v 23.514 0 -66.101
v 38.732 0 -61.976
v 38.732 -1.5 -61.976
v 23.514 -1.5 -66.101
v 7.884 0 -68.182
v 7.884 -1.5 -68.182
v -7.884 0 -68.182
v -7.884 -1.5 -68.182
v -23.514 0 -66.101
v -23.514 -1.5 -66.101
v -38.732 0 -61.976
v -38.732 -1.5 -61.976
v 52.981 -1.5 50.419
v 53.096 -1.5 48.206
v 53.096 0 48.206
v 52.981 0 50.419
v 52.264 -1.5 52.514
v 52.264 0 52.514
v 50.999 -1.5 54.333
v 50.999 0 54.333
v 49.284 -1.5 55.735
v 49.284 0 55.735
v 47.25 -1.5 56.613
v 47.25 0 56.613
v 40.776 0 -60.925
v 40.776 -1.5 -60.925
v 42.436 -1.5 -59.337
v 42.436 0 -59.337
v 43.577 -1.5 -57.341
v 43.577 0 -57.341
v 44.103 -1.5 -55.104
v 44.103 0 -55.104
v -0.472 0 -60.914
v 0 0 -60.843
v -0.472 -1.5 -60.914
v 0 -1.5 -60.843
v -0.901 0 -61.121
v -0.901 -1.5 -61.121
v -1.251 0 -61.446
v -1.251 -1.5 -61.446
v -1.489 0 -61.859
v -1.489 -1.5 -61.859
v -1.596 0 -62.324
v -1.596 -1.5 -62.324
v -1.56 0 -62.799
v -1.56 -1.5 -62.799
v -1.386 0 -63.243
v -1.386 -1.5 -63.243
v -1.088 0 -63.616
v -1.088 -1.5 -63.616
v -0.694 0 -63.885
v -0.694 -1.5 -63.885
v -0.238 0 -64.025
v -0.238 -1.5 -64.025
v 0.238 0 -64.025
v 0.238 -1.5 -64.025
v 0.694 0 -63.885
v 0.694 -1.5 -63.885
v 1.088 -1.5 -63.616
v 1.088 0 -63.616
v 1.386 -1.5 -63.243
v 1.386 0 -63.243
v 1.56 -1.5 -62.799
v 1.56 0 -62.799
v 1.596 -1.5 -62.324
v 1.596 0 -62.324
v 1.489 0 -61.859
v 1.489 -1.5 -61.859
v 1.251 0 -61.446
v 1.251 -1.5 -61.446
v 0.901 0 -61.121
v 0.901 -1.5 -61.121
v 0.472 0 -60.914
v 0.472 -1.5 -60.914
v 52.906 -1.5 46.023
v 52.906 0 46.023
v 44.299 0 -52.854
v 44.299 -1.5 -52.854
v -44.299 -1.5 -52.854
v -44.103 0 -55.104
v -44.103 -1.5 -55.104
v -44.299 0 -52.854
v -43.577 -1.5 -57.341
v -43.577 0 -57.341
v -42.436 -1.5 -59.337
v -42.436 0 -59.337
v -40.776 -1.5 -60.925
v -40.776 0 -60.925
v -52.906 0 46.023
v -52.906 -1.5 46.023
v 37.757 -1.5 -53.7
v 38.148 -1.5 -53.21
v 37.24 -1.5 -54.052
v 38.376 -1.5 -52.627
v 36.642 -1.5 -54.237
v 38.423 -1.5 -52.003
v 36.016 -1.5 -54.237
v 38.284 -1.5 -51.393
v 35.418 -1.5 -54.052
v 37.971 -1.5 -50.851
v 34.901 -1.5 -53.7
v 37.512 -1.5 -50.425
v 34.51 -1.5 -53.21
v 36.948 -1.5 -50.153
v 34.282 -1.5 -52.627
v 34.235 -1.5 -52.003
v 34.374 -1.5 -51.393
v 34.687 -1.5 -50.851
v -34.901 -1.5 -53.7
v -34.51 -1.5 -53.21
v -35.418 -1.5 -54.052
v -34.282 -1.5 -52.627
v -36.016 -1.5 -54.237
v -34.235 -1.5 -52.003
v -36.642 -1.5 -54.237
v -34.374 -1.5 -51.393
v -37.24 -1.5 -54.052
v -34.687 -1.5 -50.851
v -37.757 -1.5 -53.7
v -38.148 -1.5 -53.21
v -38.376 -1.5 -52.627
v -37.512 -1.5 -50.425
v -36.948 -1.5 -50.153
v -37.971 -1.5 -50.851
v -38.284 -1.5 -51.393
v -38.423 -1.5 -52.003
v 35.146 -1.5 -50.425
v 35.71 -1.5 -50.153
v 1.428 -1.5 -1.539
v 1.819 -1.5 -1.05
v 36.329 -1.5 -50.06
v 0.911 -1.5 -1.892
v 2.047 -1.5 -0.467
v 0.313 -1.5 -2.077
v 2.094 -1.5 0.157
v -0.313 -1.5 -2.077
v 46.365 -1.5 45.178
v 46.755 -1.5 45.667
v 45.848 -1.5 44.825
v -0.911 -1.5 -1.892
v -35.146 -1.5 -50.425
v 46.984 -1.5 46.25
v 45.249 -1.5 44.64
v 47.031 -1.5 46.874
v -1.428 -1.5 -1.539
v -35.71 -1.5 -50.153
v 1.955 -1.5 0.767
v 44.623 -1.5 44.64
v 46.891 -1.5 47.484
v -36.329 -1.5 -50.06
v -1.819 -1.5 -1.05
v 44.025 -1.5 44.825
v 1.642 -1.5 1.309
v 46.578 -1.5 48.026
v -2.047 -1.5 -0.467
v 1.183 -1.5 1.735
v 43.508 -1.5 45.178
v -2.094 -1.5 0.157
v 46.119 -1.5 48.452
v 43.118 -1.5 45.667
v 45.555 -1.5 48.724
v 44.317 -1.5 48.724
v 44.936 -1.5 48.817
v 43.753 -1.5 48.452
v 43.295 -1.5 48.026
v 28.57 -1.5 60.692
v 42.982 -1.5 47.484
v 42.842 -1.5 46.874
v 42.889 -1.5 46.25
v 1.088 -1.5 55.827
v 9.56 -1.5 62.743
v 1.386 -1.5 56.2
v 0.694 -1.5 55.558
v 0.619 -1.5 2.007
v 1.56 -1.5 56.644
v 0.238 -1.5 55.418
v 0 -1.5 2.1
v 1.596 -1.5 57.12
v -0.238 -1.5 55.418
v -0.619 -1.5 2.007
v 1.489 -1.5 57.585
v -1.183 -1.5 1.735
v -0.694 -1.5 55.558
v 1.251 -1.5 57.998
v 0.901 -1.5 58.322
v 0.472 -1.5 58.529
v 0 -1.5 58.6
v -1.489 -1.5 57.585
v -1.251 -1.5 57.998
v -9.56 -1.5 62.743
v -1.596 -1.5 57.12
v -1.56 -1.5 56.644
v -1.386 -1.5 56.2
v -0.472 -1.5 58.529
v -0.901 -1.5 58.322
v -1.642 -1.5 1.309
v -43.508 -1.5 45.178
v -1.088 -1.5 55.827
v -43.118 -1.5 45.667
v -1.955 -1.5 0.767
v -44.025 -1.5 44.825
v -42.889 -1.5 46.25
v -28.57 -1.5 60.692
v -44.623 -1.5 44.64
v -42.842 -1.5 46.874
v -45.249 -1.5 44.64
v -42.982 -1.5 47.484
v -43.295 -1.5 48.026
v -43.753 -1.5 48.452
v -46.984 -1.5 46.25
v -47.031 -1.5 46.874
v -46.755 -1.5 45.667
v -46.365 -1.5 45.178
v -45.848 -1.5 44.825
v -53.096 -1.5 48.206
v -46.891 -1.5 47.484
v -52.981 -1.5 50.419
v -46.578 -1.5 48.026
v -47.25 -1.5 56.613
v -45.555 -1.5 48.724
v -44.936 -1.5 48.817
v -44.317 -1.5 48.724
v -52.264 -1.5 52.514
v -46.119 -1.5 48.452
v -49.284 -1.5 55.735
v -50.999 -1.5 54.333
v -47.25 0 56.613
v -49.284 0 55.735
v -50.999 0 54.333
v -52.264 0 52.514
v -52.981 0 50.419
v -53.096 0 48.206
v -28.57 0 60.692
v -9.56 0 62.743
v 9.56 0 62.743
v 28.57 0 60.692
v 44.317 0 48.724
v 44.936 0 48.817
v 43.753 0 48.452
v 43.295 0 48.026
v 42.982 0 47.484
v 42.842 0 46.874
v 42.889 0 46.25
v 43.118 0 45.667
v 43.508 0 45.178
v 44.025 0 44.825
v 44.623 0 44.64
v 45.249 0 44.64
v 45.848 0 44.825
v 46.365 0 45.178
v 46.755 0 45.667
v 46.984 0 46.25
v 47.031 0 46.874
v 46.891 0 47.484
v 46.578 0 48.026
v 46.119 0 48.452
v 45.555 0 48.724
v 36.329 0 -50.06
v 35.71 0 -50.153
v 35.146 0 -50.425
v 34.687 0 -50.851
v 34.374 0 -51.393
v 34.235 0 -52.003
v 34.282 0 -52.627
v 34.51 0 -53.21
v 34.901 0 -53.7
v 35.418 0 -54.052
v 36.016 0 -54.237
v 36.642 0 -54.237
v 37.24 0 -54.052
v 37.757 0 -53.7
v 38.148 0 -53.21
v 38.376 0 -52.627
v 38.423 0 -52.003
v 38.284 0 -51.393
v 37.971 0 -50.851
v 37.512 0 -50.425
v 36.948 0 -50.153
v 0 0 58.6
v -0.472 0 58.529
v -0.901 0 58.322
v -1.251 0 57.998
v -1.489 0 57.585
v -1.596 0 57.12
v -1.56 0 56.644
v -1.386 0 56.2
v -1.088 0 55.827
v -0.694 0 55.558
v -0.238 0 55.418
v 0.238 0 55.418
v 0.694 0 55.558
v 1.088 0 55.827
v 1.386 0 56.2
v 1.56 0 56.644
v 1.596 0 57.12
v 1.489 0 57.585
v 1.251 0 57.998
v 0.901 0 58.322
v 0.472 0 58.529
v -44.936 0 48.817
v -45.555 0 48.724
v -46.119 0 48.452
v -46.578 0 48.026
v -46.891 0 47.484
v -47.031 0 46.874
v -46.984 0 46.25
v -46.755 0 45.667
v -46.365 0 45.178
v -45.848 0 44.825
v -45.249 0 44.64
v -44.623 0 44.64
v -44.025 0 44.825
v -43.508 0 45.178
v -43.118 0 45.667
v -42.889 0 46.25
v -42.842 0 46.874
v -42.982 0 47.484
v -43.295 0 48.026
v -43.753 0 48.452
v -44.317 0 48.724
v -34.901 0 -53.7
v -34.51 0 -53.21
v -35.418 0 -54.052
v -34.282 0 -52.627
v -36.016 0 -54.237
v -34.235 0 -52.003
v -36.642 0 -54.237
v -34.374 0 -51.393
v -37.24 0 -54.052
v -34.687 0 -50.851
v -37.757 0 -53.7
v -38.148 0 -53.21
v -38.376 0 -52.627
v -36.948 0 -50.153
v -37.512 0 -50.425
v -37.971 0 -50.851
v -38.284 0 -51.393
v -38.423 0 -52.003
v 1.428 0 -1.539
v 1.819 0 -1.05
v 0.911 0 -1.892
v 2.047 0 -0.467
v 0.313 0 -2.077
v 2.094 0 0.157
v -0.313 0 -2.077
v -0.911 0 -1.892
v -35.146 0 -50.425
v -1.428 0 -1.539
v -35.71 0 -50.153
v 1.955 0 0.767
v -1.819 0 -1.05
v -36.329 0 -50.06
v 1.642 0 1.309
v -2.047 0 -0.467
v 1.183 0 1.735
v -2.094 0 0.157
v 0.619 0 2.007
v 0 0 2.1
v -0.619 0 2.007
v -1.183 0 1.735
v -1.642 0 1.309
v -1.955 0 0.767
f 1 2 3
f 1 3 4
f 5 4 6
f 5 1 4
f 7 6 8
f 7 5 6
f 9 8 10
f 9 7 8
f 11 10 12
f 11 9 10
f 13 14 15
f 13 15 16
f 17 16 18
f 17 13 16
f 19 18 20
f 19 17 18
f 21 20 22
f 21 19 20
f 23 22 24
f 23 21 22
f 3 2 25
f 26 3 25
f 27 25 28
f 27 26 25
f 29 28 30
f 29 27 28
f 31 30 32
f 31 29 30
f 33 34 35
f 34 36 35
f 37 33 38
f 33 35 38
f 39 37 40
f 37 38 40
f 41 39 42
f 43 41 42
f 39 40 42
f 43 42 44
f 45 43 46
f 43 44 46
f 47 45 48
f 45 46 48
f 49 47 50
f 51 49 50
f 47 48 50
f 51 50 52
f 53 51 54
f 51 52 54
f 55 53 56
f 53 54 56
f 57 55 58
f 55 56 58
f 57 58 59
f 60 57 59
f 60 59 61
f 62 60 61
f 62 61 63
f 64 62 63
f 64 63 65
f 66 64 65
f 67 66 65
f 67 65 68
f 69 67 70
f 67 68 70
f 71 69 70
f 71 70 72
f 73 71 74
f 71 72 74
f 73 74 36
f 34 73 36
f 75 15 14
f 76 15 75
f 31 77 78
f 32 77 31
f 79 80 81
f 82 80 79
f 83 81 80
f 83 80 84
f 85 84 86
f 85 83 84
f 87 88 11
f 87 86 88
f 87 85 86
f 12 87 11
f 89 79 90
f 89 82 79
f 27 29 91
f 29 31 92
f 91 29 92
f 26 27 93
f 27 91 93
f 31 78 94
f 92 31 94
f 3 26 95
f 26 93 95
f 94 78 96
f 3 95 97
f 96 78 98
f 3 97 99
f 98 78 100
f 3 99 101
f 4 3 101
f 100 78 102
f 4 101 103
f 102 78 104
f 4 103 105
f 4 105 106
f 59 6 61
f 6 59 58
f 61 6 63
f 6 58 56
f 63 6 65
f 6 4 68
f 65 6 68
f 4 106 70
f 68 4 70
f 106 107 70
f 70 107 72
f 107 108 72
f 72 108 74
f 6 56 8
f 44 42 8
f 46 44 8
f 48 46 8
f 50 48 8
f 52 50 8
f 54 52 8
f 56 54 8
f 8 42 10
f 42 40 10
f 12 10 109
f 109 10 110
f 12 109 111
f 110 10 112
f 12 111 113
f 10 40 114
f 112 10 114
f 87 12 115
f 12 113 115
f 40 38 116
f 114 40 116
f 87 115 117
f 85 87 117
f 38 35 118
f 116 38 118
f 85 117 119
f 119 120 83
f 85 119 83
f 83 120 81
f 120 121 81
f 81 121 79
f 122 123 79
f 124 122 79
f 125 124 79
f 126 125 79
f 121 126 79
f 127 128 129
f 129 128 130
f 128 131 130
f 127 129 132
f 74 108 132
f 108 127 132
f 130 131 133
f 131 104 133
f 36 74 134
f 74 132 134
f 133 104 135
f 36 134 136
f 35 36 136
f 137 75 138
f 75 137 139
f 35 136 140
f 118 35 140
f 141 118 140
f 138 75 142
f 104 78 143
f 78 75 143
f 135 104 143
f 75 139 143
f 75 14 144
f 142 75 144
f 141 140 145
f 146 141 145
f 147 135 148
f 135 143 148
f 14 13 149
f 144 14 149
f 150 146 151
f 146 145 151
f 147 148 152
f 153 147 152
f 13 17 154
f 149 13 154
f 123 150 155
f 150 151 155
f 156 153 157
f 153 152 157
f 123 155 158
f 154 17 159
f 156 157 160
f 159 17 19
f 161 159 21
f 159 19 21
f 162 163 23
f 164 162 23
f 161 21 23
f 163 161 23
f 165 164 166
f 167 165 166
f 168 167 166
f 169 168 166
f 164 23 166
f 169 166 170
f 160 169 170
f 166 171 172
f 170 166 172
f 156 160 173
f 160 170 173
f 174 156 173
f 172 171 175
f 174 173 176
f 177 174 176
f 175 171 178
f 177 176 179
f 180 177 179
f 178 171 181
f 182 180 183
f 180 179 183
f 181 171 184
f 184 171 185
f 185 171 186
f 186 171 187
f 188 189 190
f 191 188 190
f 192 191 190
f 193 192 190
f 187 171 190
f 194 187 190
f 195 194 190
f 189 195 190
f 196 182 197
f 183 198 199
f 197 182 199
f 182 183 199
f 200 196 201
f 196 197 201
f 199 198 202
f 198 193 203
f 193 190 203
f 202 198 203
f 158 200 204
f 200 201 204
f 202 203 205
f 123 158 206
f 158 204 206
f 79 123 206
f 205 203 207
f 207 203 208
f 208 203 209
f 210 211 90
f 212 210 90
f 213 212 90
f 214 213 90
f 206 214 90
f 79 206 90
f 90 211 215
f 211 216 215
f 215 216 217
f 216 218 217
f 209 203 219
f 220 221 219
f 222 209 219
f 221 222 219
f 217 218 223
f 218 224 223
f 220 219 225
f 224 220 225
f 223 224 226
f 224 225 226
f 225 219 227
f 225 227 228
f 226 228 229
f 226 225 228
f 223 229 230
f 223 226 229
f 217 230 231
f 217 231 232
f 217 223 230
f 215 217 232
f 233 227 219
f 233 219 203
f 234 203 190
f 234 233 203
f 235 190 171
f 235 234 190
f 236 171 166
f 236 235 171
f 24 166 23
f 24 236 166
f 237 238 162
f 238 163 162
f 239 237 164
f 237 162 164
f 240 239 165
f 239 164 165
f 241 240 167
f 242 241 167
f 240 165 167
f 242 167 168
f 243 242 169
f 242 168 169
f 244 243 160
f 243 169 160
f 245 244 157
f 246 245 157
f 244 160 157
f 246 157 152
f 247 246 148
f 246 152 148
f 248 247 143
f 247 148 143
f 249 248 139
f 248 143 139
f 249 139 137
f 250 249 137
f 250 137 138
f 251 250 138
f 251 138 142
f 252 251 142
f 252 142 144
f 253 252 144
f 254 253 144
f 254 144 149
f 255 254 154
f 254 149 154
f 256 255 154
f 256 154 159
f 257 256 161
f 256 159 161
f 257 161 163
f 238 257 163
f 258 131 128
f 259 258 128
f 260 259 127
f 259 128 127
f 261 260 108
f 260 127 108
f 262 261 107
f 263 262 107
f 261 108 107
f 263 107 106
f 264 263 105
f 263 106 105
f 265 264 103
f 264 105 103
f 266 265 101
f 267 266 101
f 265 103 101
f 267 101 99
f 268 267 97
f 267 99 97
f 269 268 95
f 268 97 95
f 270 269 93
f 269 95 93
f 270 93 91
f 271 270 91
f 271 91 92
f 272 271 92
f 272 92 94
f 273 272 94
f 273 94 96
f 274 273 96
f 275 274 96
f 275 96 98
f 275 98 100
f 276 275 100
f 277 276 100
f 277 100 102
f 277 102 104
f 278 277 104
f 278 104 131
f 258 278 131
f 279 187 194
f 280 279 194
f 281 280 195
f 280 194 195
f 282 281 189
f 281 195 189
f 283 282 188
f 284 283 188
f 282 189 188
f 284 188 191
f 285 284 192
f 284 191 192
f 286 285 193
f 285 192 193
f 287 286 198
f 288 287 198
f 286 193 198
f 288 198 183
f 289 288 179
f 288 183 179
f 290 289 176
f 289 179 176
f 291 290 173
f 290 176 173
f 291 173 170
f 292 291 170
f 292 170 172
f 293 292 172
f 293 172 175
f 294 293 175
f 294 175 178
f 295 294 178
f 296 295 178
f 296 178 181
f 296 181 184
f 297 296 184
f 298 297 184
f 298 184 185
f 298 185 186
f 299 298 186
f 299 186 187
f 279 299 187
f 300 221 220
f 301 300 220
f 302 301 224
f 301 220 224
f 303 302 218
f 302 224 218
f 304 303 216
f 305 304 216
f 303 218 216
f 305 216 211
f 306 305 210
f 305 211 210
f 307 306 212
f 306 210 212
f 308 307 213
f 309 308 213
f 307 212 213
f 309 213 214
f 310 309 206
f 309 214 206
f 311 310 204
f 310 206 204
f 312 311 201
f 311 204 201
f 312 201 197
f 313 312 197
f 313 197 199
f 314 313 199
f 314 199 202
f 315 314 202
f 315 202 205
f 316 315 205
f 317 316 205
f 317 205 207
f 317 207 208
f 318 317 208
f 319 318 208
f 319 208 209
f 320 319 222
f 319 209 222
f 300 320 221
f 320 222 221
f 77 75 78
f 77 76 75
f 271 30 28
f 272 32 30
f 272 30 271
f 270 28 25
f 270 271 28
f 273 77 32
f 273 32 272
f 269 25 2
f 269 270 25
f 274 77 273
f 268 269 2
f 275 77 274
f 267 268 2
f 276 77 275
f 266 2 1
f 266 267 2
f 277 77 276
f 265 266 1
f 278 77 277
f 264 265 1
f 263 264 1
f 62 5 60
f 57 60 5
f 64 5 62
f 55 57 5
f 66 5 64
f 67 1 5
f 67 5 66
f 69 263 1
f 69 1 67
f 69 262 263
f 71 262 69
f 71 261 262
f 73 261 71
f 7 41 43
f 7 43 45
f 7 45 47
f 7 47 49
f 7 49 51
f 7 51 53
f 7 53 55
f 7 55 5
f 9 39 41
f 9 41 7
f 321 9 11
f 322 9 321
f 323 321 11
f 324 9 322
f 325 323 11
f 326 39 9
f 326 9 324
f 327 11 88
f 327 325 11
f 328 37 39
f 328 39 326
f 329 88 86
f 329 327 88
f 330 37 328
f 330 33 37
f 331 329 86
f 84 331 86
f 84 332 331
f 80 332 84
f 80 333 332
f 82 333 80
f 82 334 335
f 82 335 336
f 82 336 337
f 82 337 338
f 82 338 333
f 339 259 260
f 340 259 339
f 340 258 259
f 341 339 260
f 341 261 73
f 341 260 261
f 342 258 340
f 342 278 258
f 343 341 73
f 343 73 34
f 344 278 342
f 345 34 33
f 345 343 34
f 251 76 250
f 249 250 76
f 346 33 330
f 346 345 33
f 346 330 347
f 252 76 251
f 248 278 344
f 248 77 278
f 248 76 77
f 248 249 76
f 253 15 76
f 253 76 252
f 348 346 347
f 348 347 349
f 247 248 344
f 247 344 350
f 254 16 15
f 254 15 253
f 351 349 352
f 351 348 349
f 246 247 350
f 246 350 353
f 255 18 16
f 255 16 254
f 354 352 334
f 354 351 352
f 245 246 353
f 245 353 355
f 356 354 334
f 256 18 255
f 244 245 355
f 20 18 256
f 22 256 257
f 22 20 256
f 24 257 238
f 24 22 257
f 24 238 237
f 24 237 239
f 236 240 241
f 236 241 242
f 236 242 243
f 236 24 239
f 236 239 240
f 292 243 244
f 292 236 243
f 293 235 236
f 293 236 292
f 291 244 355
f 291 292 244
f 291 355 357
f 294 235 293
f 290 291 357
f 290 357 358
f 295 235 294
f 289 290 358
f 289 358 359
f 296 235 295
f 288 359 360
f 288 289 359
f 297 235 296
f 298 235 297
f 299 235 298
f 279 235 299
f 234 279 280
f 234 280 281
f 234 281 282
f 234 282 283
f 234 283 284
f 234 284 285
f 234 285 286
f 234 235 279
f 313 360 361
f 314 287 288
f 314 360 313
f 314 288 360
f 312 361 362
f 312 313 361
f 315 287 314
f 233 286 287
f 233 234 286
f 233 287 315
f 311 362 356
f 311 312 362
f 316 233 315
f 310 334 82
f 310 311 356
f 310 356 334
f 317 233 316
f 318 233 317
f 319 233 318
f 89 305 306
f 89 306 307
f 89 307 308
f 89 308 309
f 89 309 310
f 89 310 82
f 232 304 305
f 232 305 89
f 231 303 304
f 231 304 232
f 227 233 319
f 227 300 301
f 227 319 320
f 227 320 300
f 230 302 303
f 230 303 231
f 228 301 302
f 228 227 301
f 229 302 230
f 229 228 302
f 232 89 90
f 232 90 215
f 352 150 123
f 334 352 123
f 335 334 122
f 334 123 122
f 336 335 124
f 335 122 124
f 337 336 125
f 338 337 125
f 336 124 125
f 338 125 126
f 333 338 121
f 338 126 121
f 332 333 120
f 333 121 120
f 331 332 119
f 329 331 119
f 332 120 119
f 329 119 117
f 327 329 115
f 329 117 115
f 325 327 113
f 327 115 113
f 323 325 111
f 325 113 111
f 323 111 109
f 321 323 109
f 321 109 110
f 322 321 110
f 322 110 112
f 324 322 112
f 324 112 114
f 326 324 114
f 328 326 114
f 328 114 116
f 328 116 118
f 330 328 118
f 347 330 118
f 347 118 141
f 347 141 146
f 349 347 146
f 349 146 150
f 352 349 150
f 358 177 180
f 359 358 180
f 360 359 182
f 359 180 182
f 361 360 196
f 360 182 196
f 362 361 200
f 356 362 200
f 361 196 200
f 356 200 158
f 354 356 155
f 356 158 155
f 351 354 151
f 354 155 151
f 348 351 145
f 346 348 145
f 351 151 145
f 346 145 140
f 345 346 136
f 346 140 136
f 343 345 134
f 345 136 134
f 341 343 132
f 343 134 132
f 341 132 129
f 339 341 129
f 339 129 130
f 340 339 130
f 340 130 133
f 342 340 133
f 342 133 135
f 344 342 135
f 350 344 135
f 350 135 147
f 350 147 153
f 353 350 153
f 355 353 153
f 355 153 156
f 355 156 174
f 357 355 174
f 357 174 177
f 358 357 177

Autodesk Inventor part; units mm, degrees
ref_plane "YZ Plane" through (0, 0, 0) normal (1, 0, 0) x (0, 1, 0)
ref_plane "XZ Plane" through (0, 0, 0) normal (0, 1, 0) x (-1, 0, 0)
ref_plane "XY Plane" through (0, 0, 0) normal (0, 0, 1) x (1, 0, 0)
sketch "Skizze1" plane through (0, 0, 0) normal (0, 1, 0) x (-1, 0, 0)
  line L0 (13, 63) -> (-13, 63) construction
  line L1 (0, 63) -> (0, -88) construction
  arc A0 (-35.0888, -80.7018) -> (35.0888, -80.7018) centre (0, 0) ccw construction
  arc A1 (-85.5688, 20.542) -> (-77.3365, -41.9889) centre (0, 0) ccw construction
  arc A2 (77.3365, -41.9889) -> (85.5688, 20.542) centre (0, 0) ccw construction
  line L2 (36.329, -52.1602) -> (44.9364, 46.717) construction
  line L3 (44.9364, 46.717) -> (-44.9364, 46.717) construction
  line L4 (-44.9364, 46.717) -> (-36.329, -52.1602) construction
  line L5 (-36.329, -52.1602) -> (36.329, -52.1602) construction
  line L6 (44.2988, -52.854) -> (52.9063, 46.0232)
  line L7 (44.9364, 54.717) -> (-44.9364, 54.717)
  line L8 (-52.9063, 46.0232) -> (-44.2988, -52.854)
  line L9 (-36.329, -60.1602) -> (36.329, -60.1602)
  arc A3 (36.329, -60.1602) -> (44.2988, -52.854) centre (36.329, -52.1602) ccw
  arc A4 (-44.2988, -52.854) -> (-36.329, -60.1602) centre (-36.329, -52.1602) ccw
  arc A5 (-44.9364, 54.717) -> (-52.9063, 46.0232) centre (-44.9364, 46.717) ccw
  arc A6 (52.9063, 46.0232) -> (44.9364, 54.717) centre (44.9364, 46.717) ccw
  line L10 (43.6628, -60.1602) -> (53.6631, 54.717)
  line L11 (53.6631, 54.717) -> (-53.6631, 54.717)
  line L12 (-53.6631, 54.717) -> (-43.6628, -60.1602)
  line L13 (-43.6628, -60.1602) -> (43.6628, -60.1602)
  arc A7 (-43.6628, -60.1602) -> (43.6628, -60.1602) centre (0, 50.7799) ccw
  arc A8 (53.6631, 54.717) -> (-53.6631, 54.717) centre (0, -114.9743) ccw
  line L14 (0, 63) -> (0, 51)
  line L15 (6, 51) -> (-6, 51)
  line L16 (-6, 51) -> (-6, 63)
  line L17 (-6, 63) -> (6, 63)
  line L18 (6, 63) -> (6, 51)
  line L19 (6, 51) -> (-6, 63) construction
  line L20 (-6, 51) -> (6, 63) construction
  line L21 (0, -68.4432) -> (0, -56.4432)
  line L22 (6, -68.4432) -> (-6, -68.4432)
  line L23 (-6, -68.4432) -> (-6, -56.4432)
  line L24 (-6, -56.4432) -> (6, -56.4432)
  line L25 (6, -56.4432) -> (6, -68.4432)
  line L26 (6, -68.4432) -> (-6, -56.4432) construction
  line L27 (-6, -68.4432) -> (6, -56.4432) construction
  circle A9 centre (0, 0) radius 88
  point P0 (0, 0)
  point P1 (136.7943, -100.6712)
  point P2 (133.0243, -72.1229)
  point P3 (126.2508, -68.622)
  point P4 (131.1382, -105.7457)
  point P5 (170.7312, -118.661)
  point P6 (170.703, -118.661)
  point P7 (165.9867, -123.8079)
  point P8 (170.7158, -118.647)
  point P9 (181.0377, -128.1052)
  point P10 (176.3086, -133.2662)
  point P11 (-44.9364, 54.717)
  point P12 (-44.9364, 54.717)
  point P13 (0, 57)
  point P14 (0, -62.4432)
  point P15 (0, -62.4432)
  point P16 (0, 57)
  point P17 (6, -68.2921)
  point P18 (-6, -68.2921)
  point P19 (-6, 62.8988)
  point P20 (6, 62.8988)
  dimension "d27" = 72.6579
  dimension "d28" = 89.8728
  dimension "d29" = 8
  dimension "d30" = 8
  dimension "d38" = 8
  dimension "d43" = 12
  dimension "d44" = 12
  dimension "d45" = 12
  dimension "d46" = 12
extrude "Extrusion1" add sketch "Skizze1" against normal blind 1.5 contours A3 L9 L25 L24 L23 A4 L8 A5 L7 L16 L15 L18 A6 L6 | L10 L13 A3 | A6 L11 L10 | L13 A7 L25 L9 | L7 L18 A8 L11 | L25 A7 L21 L9 | L9 L21 L24 L25 | L18 L15 L14 L7 | L7 L14 A8 L18 | L21 A7 L23 L9 | L9 L23 L24 L21 | L14 L15 L16 L7 | L7 L16 A8 L14 | L23 A7 L13 L9 | L7 L11 A8 L16 | L13 L12 A4 | A5 L12 L11
hole "Bohrung1" at (36.329, 0, -52.1602) at (44.9364, 0, 46.717) at (0, 0, 0) at (-36.329, 0, -52.1602) at (-44.9364, 0, 46.717) direction (0, -1, 0) diameter 4.2 depth 1.5
hole "Bohrung2" at (0, 0, 57) at (0, 0, -62.4432) direction (0, -1, 0) diameter 3.2 depth 1.5
fillet "Rundung2" radius 8 4 edges at (53.6631, -0.75, 54.717) (43.6628, -0.75, -60.1602) (-43.6628, -0.75, -60.1602) (-53.6631, -0.75, 54.717)
properties part number "Spiegelhalterung"
